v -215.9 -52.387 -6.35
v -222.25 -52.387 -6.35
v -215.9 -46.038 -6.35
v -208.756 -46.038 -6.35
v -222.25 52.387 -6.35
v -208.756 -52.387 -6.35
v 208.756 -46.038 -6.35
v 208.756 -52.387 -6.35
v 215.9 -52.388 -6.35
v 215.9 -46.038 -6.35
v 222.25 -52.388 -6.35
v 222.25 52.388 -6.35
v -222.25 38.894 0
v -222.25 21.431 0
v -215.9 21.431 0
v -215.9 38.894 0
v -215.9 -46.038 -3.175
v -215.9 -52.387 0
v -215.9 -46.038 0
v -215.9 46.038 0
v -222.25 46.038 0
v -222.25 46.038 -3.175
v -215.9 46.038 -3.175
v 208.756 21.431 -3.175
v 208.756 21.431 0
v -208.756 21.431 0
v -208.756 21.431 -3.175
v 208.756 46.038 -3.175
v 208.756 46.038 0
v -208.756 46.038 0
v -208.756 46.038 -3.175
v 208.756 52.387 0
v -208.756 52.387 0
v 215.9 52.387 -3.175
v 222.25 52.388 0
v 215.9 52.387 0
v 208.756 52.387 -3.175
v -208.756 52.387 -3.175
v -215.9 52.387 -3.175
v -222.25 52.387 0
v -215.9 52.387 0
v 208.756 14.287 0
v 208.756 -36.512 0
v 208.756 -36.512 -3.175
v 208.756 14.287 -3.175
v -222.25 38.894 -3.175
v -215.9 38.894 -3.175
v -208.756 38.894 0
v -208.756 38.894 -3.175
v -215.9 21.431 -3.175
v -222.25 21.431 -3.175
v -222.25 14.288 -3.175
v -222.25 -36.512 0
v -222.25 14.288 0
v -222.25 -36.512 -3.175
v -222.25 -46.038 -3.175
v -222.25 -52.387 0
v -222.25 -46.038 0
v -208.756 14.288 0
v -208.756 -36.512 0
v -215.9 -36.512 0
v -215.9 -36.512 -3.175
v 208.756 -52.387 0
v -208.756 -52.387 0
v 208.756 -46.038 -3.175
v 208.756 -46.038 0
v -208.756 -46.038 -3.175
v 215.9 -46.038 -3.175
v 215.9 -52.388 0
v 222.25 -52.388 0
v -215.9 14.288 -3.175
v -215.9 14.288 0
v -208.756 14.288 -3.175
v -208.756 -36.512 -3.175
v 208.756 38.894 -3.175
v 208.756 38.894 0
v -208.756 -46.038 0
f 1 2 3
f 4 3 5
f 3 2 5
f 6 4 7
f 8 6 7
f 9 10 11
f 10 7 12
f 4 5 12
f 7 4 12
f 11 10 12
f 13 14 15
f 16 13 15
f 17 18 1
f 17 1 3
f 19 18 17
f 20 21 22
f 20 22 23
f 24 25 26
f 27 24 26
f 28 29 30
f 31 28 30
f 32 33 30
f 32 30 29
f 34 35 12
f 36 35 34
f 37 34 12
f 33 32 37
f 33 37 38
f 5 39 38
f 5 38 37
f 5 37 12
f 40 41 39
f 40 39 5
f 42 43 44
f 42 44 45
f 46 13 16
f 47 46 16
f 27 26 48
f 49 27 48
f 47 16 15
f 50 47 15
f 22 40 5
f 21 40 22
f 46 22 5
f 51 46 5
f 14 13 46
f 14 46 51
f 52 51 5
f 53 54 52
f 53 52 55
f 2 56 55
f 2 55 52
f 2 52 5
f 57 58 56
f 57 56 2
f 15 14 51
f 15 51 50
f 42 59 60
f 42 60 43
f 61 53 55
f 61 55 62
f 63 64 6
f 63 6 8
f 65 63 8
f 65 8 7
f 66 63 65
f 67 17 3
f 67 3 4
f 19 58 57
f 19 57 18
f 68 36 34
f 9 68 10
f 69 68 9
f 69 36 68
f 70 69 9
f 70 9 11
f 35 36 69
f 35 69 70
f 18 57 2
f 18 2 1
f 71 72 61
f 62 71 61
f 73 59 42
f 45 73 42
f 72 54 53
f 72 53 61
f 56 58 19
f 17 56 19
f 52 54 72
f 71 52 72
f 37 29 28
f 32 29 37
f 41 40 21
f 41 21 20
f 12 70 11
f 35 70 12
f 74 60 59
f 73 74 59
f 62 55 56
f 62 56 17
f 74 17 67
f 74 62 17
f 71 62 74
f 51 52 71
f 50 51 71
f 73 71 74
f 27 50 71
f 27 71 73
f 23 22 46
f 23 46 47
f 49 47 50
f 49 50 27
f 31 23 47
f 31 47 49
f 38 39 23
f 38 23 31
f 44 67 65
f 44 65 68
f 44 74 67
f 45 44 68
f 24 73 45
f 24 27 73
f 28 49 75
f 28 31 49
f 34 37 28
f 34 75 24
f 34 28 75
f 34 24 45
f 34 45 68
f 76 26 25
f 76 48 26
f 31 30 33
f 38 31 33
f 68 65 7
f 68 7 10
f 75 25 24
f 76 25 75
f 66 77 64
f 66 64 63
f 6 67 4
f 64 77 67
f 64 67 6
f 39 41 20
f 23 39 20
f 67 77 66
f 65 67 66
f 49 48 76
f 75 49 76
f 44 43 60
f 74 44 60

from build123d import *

# Parameters (mm, degrees)
F0_W     = 417.5125
F0_H     = 6.35
F0_W_2   = 7.14375
F0_H_2   = 50.8
F0_H_3   = 17.4625
F0_H_4   = 7.14375
F0_W_3   = 6.35
F0_H_5   = 9.525
F1_DEPTH = 6.35
F2_DEPTH = 3.175


with BuildPart() as f1:
    # F0 (on Top) → F1 (new body)
    with BuildSketch(Plane.XY):
        with Locations((0, 49.2125)):
            Rectangle(F0_W, F0_H)
        with Locations((0, -49.2125)):
            Rectangle(F0_W, F0_H)
        with Locations((-212.328125, -11.1125)):
            Rectangle(F0_W_2, F0_H_2)
        with Locations((-212.328125, 30.1625)):
            Rectangle(F0_W_2, F0_H_3)
        with Locations((0, 42.465625)):
            Rectangle(F0_W, F0_H_4)
        with Locations((0, 17.859375)):
            Rectangle(F0_W, F0_H_4)
        Polygon((222.25, -52.3875), (222.25, 52.3875), (215.9, 52.3875), (215.9, 46.0375), (215.9, 38.89375), (215.9, 21.43125), (215.9, 14.2875), (215.9, -36.5125), (215.9, -46.0375), (215.9, -52.3875), align=None)
        with Locations((-219.075, -11.1125)):
            Rectangle(F0_W_3, F0_H_2)
        with Locations((0, -41.275)):
            Rectangle(F0_W, F0_H_5)
        with Locations((0, -11.1125)):
            Rectangle(F0_W, F0_H_2)
        with Locations((0, 30.1625)):
            Rectangle(F0_W, F0_H_3)
        with Locations((-219.075, 42.465625)):
            Rectangle(F0_W_3, F0_H_4)
        with Locations((-212.328125, 49.2125)):
            Rectangle(F0_W_2, F0_H)
        with Locations((212.328125, 49.2125)):
            Rectangle(F0_W_2, F0_H)
        with Locations((-219.075, 49.2125)):
            Rectangle(F0_W_3, F0_H)
        with Locations((-212.328125, 17.859375)):
            Rectangle(F0_W_2, F0_H_4)
        with Locations((-212.328125, 42.465625)):
            Rectangle(F0_W_2, F0_H_4)
        with Locations((212.328125, 30.1625)):
            Rectangle(F0_W_2, F0_H_3)
        with Locations((-219.075, 30.1625)):
            Rectangle(F0_W_3, F0_H_3)
        with Locations((-219.075, 17.859375)):
            Rectangle(F0_W_3, F0_H_4)
        with Locations((-219.075, -41.275)):
            Rectangle(F0_W_3, F0_H_5)
        with Locations((212.328125, -41.275)):
            Rectangle(F0_W_2, F0_H_5)
        with Locations((212.328125, 42.465625)):
            Rectangle(F0_W_2, F0_H_4)
        with Locations((212.328125, 17.859375)):
            Rectangle(F0_W_2, F0_H_4)
        with Locations((-212.328125, -41.275)):
            Rectangle(F0_W_2, F0_H_5)
        with Locations((-219.075, -49.2125)):
            Rectangle(F0_W_3, F0_H)
        with Locations((212.328125, -11.1125)):
            Rectangle(F0_W_2, F0_H_2)
    extrude(amount=-F1_DEPTH)

    # F0 (on Top) → F2 (cut)
    with BuildSketch(Plane.XY):
        with Locations((-212.328125, -41.275)):
            Rectangle(F0_W_2, F0_H_5)
        with Locations((-212.328125, -11.1125)):
            Rectangle(F0_W_2, F0_H_2)
        with Locations((-212.328125, 17.859375)):
            Rectangle(F0_W_2, F0_H_4)
        with Locations((-212.328125, 30.1625)):
            Rectangle(F0_W_2, F0_H_3)
        with Locations((-212.328125, 42.465625)):
            Rectangle(F0_W_2, F0_H_4)
        with Locations((-212.328125, 49.2125)):
            Rectangle(F0_W_2, F0_H)
        with Locations((-219.075, 42.465625)):
            Rectangle(F0_W_3, F0_H_4)
        with Locations((-219.075, 17.859375)):
            Rectangle(F0_W_3, F0_H_4)
        with Locations((0, 17.859375)):
            Rectangle(F0_W, F0_H_4)
        with Locations((0, 42.465625)):
            Rectangle(F0_W, F0_H_4)
        with Locations((-219.075, -41.275)):
            Rectangle(F0_W_3, F0_H_5)
        with Locations((0, -41.275)):
            Rectangle(F0_W, F0_H_5)
        with Locations((212.328125, -41.275)):
            Rectangle(F0_W_2, F0_H_5)
        with Locations((212.328125, 17.859375)):
            Rectangle(F0_W_2, F0_H_4)
        with Locations((212.328125, 42.465625)):
            Rectangle(F0_W_2, F0_H_4)
        with Locations((212.328125, 49.2125)):
            Rectangle(F0_W_2, F0_H)
        with Locations((212.328125, 30.1625)):
            Rectangle(F0_W_2, F0_H_3)
        with Locations((212.328125, -11.1125)):
            Rectangle(F0_W_2, F0_H_2)
    extrude(amount=-F2_DEPTH, mode=Mode.SUBTRACT)


solid = f1.part
